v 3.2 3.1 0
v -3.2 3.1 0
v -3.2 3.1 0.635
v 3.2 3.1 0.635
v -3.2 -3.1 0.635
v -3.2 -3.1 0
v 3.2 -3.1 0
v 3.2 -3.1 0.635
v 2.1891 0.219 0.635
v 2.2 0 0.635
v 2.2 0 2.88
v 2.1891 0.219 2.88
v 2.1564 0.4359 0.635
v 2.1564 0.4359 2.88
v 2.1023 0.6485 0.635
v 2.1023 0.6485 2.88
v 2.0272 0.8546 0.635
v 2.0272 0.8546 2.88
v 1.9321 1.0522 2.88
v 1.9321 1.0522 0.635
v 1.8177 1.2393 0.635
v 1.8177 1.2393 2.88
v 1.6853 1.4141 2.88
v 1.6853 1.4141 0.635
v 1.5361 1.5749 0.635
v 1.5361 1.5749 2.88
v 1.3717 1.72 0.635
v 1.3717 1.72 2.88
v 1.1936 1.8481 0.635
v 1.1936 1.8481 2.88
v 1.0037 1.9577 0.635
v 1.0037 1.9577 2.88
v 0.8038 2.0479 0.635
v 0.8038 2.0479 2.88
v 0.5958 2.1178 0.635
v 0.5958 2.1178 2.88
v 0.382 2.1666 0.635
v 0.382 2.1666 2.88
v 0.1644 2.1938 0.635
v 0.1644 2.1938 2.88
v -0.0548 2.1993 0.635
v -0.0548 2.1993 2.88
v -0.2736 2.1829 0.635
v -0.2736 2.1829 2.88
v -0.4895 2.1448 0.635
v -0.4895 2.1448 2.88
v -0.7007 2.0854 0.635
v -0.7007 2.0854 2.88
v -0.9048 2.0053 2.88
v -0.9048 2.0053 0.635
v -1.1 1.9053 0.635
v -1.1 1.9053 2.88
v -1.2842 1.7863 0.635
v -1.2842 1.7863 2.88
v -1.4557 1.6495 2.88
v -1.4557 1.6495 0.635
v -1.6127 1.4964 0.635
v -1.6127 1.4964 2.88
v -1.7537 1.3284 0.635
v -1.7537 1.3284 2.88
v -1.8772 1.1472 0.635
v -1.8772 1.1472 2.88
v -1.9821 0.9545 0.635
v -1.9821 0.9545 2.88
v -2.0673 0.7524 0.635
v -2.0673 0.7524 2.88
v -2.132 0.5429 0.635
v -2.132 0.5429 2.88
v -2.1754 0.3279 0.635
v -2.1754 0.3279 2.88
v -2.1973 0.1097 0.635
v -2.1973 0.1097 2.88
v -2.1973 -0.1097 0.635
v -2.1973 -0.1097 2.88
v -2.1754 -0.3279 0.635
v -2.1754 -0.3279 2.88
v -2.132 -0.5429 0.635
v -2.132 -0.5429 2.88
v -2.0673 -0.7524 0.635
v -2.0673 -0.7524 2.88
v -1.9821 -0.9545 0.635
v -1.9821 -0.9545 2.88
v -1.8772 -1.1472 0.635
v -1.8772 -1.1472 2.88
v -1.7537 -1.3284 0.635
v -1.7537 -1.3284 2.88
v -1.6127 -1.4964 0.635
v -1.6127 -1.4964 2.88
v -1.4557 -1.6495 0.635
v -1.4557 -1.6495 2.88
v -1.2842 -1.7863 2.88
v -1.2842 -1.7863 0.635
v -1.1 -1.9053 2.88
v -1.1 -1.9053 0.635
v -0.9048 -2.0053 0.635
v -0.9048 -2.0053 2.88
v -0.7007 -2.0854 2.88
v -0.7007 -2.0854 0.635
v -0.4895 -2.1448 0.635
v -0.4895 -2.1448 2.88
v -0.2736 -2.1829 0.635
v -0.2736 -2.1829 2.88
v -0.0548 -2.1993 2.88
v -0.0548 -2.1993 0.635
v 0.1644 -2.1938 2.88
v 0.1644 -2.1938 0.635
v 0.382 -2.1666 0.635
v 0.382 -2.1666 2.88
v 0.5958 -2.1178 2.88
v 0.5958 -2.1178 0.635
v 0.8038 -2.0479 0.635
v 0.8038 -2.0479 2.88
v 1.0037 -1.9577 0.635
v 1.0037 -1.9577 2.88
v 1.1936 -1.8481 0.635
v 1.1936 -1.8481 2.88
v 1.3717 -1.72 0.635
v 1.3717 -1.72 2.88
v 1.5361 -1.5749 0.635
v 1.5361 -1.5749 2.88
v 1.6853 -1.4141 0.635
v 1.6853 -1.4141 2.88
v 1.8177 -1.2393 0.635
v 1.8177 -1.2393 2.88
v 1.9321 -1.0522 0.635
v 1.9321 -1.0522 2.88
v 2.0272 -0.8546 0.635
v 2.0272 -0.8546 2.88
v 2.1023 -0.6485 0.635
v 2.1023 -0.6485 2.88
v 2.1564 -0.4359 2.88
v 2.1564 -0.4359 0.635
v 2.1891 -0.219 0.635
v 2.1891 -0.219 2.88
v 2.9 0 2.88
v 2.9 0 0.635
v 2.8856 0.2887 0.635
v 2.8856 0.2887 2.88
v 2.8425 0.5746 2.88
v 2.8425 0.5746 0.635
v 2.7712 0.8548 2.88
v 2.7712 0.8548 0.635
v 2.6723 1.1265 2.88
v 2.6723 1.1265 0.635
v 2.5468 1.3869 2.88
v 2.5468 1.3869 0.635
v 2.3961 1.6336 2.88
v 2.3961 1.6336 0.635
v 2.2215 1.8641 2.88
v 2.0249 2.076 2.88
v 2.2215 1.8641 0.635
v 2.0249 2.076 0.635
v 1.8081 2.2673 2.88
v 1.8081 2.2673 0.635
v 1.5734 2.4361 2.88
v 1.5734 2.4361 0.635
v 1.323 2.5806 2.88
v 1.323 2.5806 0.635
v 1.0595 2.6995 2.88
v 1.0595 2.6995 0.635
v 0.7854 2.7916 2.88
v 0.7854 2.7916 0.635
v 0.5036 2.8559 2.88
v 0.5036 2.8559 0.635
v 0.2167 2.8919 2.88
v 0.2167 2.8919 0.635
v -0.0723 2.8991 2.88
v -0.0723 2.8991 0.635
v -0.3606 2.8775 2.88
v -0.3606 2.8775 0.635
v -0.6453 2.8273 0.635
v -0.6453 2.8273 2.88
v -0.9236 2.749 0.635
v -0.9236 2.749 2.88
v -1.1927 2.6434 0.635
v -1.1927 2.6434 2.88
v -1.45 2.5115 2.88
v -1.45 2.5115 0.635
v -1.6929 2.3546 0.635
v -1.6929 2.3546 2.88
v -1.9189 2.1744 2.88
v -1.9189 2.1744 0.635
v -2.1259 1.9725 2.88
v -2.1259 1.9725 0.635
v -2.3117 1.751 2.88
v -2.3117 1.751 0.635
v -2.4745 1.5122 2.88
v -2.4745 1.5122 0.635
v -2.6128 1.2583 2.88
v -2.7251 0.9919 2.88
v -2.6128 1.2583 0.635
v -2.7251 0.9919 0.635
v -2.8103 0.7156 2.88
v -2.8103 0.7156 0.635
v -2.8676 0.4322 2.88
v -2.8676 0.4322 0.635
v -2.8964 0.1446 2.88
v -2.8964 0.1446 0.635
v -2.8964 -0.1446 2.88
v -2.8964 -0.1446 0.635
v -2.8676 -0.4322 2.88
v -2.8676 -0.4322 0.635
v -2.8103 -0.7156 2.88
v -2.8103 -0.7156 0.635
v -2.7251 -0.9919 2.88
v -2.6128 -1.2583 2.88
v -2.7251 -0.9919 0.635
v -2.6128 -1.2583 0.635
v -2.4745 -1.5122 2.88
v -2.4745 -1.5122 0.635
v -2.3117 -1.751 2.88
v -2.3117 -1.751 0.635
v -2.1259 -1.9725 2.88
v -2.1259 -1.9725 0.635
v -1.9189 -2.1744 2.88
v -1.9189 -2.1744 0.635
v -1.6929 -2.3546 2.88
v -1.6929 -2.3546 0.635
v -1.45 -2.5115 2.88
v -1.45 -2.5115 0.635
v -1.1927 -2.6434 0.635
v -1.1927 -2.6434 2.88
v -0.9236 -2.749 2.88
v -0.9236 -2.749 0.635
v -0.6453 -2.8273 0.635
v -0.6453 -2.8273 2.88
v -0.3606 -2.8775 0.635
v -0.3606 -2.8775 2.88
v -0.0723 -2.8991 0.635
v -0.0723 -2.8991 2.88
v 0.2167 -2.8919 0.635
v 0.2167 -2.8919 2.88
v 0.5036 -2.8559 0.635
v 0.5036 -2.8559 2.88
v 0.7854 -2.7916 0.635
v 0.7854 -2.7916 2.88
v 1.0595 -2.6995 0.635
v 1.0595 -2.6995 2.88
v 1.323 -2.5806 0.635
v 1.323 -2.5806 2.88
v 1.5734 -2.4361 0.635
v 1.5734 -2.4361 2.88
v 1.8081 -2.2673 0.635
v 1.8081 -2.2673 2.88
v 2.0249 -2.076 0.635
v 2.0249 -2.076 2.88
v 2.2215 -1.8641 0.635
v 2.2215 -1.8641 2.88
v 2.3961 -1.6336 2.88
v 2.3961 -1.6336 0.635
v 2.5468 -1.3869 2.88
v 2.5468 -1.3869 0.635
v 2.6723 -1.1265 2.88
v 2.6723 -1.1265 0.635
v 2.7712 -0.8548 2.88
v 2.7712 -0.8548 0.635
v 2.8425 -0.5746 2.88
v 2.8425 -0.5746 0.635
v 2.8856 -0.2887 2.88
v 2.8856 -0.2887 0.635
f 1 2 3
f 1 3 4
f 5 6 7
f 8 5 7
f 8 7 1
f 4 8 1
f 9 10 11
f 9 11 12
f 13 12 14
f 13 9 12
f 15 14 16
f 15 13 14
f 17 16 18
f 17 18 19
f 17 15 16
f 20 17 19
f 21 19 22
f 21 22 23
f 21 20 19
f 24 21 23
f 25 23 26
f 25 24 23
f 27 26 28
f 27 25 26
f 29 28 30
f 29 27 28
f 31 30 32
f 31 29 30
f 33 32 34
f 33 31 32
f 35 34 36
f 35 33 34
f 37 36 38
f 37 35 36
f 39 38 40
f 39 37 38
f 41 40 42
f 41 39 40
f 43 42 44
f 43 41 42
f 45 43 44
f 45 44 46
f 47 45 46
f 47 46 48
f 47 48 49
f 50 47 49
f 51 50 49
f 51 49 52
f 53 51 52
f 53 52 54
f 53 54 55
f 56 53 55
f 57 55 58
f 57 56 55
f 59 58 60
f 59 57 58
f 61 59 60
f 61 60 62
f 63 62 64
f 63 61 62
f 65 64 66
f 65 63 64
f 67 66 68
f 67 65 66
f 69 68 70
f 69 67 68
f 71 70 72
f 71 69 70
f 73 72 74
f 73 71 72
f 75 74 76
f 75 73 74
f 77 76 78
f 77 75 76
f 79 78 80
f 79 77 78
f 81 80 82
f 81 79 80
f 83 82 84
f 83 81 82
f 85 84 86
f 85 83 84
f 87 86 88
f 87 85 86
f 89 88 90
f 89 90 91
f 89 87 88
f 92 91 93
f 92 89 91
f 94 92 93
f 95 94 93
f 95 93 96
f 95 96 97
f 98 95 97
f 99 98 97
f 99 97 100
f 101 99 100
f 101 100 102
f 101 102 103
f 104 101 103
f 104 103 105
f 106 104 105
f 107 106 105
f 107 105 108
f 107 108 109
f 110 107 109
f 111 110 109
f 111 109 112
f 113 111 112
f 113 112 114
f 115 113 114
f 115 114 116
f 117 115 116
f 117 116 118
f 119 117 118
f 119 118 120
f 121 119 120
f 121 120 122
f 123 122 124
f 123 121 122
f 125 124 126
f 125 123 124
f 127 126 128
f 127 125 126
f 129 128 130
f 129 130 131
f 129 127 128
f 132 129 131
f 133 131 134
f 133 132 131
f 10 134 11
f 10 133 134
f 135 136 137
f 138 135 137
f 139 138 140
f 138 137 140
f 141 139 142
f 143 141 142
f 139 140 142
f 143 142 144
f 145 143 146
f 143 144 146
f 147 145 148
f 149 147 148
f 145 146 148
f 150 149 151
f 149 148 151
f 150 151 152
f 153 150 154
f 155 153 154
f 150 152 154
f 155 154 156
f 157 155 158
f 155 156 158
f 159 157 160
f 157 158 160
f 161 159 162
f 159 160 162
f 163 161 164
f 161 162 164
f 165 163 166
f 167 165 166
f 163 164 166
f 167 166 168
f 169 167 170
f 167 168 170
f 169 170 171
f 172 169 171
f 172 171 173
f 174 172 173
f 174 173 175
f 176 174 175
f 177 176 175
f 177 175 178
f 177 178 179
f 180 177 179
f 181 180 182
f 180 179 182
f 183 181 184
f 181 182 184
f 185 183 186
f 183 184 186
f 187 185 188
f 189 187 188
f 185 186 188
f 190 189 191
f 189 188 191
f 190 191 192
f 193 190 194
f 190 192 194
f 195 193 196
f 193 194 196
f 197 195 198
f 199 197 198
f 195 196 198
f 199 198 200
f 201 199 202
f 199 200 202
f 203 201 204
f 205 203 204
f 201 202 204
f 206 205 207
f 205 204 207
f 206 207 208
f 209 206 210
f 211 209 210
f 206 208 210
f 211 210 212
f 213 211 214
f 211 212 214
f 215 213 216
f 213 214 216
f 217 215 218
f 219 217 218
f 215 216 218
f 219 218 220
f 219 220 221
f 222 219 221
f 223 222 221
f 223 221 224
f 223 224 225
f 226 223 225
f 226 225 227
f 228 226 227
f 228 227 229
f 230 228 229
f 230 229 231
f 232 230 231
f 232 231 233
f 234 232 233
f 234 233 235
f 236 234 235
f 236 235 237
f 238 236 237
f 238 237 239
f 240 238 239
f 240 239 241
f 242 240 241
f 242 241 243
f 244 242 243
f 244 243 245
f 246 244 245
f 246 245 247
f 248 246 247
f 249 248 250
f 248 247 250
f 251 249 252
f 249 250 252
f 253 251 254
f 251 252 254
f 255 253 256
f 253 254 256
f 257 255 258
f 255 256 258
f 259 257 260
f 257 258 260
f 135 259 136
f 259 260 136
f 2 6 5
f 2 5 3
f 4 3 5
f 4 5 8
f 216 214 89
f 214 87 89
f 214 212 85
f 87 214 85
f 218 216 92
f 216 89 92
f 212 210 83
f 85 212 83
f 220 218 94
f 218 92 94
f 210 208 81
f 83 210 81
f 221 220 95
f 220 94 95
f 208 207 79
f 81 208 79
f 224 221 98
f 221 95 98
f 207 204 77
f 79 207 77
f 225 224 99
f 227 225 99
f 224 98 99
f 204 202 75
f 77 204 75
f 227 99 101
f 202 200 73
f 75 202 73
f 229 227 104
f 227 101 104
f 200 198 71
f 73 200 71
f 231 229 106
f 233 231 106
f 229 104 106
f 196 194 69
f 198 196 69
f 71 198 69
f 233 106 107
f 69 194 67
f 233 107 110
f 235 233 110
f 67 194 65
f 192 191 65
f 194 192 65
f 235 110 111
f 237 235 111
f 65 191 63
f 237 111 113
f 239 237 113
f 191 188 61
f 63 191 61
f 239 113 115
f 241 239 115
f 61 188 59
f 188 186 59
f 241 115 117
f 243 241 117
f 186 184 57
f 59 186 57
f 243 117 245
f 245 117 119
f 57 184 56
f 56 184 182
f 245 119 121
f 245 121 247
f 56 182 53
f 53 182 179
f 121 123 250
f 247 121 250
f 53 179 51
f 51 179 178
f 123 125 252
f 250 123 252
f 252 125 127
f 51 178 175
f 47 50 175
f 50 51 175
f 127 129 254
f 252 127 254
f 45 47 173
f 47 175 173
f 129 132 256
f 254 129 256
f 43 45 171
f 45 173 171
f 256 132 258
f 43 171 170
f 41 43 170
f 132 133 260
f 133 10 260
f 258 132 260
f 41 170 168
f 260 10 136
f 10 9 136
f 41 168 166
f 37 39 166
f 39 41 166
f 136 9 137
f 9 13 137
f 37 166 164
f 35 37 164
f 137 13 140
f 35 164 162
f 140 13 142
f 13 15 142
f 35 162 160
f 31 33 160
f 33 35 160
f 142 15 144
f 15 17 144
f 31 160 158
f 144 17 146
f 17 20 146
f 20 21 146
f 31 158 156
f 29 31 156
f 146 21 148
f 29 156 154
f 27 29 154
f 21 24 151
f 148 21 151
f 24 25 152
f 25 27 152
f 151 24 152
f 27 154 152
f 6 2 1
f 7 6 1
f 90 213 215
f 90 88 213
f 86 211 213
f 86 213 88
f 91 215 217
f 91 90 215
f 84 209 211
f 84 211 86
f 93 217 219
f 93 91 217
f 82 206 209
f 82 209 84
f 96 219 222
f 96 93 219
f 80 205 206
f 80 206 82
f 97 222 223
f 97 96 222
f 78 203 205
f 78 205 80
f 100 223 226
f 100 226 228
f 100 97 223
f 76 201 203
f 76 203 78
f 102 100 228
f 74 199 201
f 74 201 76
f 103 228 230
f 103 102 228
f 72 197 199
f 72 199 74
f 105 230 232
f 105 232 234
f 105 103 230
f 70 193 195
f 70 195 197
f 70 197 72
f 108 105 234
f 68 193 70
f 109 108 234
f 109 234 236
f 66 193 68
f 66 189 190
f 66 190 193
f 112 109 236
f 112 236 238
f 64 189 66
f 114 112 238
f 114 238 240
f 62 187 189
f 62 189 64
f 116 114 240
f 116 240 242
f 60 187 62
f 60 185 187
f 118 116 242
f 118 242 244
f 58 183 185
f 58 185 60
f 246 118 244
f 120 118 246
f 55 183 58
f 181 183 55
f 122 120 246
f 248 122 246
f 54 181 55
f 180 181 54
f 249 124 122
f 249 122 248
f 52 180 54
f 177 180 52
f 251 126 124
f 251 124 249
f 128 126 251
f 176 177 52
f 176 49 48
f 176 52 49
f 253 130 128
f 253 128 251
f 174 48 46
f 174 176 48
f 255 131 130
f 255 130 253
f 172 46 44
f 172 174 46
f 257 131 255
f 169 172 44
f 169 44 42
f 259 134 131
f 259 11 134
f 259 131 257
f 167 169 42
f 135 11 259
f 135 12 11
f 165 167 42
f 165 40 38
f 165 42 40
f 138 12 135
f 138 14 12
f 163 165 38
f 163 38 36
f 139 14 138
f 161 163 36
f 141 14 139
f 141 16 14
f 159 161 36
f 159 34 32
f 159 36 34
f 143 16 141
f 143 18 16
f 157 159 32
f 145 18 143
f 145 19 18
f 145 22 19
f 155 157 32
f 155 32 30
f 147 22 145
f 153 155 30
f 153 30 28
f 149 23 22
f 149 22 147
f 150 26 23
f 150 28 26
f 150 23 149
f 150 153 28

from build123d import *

# Parameters (mm, degrees)
SKETCH_W      = 6.4
SKETCH_H      = 6.2
PAD_DEPTH     = 0.635
SKETCH001_R   = 2.9
SKETCH001_R_2 = 2.2
PAD001_DEPTH  = 2.245


with BuildPart() as pad:
    # Sketch → Pad (new body)
    with BuildSketch(Plane.XY):
        Rectangle(SKETCH_W, SKETCH_H)
    extrude(amount=PAD_DEPTH)


with BuildPart() as pad001:
    # Sketch001 → Pad001 (new body)
    with BuildSketch(Plane.XY.offset(0.635)):
        Circle(SKETCH001_R)
        Circle(SKETCH001_R_2, mode=Mode.SUBTRACT)
    extrude(amount=PAD001_DEPTH)


solid = Compound([pad.part, pad001.part])
